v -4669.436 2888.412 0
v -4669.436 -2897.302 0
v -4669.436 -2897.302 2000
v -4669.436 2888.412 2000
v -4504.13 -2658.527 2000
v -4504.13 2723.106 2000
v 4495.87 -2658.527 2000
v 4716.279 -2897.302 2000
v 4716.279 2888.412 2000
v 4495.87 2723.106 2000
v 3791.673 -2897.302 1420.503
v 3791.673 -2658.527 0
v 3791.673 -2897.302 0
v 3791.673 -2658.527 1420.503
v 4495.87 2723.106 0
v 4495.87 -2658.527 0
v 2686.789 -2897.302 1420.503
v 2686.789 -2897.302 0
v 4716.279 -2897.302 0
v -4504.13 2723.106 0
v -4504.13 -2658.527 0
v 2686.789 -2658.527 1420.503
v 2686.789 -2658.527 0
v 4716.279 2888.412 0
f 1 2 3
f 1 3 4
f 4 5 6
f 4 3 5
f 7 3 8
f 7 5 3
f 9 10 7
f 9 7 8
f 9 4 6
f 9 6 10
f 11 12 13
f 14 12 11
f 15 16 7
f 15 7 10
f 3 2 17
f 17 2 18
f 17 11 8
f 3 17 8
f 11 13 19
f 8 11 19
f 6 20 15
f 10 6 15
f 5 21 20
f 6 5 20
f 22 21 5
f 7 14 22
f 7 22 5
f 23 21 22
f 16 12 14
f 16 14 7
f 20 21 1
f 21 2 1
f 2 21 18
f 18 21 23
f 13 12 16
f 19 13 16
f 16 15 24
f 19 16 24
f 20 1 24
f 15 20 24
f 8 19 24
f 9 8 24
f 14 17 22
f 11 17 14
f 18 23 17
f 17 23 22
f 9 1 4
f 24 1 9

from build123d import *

# Parameters (mm, degrees)
F0_W     = 9385.715129
F0_H     = 5785.714729
F0_W_2   = 9000
F0_H_2   = 5381.632708
F1_DEPTH = 2000
F2_W     = 1104.88391
F2_H     = 1420.503378
F3_DEPTH = 25.4
F4_DEPTH = 1727.2


with BuildPart() as f1:
    # F0 (on Top) → F1 (new body)
    with BuildSketch(Plane.XY):
        with Locations((23.421733, -4.445001)):
            Rectangle(F0_W, F0_H)
        with Locations((-4.129804, 32.289783)):
            Rectangle(F0_W_2, F0_H_2, mode=Mode.SUBTRACT)
    extrude(amount=F1_DEPTH)

    # F2 (on face) → F3 (cut)
    with BuildSketch(Plane.XZ.offset(2897.302365)):
        with Locations((3239.230752, 710.251689)):
            Rectangle(F2_W, F2_H)
    extrude(amount=F3_DEPTH, mode=Mode.SUBTRACT)

    # F2 (on face) → F4 (cut)
    with BuildSketch(Plane.XZ.offset(2897.302365)):
        with Locations((3239.230752, 710.251689)):
            Rectangle(F2_W, F2_H)
    extrude(amount=-F4_DEPTH, mode=Mode.SUBTRACT)


solid = f1.part
